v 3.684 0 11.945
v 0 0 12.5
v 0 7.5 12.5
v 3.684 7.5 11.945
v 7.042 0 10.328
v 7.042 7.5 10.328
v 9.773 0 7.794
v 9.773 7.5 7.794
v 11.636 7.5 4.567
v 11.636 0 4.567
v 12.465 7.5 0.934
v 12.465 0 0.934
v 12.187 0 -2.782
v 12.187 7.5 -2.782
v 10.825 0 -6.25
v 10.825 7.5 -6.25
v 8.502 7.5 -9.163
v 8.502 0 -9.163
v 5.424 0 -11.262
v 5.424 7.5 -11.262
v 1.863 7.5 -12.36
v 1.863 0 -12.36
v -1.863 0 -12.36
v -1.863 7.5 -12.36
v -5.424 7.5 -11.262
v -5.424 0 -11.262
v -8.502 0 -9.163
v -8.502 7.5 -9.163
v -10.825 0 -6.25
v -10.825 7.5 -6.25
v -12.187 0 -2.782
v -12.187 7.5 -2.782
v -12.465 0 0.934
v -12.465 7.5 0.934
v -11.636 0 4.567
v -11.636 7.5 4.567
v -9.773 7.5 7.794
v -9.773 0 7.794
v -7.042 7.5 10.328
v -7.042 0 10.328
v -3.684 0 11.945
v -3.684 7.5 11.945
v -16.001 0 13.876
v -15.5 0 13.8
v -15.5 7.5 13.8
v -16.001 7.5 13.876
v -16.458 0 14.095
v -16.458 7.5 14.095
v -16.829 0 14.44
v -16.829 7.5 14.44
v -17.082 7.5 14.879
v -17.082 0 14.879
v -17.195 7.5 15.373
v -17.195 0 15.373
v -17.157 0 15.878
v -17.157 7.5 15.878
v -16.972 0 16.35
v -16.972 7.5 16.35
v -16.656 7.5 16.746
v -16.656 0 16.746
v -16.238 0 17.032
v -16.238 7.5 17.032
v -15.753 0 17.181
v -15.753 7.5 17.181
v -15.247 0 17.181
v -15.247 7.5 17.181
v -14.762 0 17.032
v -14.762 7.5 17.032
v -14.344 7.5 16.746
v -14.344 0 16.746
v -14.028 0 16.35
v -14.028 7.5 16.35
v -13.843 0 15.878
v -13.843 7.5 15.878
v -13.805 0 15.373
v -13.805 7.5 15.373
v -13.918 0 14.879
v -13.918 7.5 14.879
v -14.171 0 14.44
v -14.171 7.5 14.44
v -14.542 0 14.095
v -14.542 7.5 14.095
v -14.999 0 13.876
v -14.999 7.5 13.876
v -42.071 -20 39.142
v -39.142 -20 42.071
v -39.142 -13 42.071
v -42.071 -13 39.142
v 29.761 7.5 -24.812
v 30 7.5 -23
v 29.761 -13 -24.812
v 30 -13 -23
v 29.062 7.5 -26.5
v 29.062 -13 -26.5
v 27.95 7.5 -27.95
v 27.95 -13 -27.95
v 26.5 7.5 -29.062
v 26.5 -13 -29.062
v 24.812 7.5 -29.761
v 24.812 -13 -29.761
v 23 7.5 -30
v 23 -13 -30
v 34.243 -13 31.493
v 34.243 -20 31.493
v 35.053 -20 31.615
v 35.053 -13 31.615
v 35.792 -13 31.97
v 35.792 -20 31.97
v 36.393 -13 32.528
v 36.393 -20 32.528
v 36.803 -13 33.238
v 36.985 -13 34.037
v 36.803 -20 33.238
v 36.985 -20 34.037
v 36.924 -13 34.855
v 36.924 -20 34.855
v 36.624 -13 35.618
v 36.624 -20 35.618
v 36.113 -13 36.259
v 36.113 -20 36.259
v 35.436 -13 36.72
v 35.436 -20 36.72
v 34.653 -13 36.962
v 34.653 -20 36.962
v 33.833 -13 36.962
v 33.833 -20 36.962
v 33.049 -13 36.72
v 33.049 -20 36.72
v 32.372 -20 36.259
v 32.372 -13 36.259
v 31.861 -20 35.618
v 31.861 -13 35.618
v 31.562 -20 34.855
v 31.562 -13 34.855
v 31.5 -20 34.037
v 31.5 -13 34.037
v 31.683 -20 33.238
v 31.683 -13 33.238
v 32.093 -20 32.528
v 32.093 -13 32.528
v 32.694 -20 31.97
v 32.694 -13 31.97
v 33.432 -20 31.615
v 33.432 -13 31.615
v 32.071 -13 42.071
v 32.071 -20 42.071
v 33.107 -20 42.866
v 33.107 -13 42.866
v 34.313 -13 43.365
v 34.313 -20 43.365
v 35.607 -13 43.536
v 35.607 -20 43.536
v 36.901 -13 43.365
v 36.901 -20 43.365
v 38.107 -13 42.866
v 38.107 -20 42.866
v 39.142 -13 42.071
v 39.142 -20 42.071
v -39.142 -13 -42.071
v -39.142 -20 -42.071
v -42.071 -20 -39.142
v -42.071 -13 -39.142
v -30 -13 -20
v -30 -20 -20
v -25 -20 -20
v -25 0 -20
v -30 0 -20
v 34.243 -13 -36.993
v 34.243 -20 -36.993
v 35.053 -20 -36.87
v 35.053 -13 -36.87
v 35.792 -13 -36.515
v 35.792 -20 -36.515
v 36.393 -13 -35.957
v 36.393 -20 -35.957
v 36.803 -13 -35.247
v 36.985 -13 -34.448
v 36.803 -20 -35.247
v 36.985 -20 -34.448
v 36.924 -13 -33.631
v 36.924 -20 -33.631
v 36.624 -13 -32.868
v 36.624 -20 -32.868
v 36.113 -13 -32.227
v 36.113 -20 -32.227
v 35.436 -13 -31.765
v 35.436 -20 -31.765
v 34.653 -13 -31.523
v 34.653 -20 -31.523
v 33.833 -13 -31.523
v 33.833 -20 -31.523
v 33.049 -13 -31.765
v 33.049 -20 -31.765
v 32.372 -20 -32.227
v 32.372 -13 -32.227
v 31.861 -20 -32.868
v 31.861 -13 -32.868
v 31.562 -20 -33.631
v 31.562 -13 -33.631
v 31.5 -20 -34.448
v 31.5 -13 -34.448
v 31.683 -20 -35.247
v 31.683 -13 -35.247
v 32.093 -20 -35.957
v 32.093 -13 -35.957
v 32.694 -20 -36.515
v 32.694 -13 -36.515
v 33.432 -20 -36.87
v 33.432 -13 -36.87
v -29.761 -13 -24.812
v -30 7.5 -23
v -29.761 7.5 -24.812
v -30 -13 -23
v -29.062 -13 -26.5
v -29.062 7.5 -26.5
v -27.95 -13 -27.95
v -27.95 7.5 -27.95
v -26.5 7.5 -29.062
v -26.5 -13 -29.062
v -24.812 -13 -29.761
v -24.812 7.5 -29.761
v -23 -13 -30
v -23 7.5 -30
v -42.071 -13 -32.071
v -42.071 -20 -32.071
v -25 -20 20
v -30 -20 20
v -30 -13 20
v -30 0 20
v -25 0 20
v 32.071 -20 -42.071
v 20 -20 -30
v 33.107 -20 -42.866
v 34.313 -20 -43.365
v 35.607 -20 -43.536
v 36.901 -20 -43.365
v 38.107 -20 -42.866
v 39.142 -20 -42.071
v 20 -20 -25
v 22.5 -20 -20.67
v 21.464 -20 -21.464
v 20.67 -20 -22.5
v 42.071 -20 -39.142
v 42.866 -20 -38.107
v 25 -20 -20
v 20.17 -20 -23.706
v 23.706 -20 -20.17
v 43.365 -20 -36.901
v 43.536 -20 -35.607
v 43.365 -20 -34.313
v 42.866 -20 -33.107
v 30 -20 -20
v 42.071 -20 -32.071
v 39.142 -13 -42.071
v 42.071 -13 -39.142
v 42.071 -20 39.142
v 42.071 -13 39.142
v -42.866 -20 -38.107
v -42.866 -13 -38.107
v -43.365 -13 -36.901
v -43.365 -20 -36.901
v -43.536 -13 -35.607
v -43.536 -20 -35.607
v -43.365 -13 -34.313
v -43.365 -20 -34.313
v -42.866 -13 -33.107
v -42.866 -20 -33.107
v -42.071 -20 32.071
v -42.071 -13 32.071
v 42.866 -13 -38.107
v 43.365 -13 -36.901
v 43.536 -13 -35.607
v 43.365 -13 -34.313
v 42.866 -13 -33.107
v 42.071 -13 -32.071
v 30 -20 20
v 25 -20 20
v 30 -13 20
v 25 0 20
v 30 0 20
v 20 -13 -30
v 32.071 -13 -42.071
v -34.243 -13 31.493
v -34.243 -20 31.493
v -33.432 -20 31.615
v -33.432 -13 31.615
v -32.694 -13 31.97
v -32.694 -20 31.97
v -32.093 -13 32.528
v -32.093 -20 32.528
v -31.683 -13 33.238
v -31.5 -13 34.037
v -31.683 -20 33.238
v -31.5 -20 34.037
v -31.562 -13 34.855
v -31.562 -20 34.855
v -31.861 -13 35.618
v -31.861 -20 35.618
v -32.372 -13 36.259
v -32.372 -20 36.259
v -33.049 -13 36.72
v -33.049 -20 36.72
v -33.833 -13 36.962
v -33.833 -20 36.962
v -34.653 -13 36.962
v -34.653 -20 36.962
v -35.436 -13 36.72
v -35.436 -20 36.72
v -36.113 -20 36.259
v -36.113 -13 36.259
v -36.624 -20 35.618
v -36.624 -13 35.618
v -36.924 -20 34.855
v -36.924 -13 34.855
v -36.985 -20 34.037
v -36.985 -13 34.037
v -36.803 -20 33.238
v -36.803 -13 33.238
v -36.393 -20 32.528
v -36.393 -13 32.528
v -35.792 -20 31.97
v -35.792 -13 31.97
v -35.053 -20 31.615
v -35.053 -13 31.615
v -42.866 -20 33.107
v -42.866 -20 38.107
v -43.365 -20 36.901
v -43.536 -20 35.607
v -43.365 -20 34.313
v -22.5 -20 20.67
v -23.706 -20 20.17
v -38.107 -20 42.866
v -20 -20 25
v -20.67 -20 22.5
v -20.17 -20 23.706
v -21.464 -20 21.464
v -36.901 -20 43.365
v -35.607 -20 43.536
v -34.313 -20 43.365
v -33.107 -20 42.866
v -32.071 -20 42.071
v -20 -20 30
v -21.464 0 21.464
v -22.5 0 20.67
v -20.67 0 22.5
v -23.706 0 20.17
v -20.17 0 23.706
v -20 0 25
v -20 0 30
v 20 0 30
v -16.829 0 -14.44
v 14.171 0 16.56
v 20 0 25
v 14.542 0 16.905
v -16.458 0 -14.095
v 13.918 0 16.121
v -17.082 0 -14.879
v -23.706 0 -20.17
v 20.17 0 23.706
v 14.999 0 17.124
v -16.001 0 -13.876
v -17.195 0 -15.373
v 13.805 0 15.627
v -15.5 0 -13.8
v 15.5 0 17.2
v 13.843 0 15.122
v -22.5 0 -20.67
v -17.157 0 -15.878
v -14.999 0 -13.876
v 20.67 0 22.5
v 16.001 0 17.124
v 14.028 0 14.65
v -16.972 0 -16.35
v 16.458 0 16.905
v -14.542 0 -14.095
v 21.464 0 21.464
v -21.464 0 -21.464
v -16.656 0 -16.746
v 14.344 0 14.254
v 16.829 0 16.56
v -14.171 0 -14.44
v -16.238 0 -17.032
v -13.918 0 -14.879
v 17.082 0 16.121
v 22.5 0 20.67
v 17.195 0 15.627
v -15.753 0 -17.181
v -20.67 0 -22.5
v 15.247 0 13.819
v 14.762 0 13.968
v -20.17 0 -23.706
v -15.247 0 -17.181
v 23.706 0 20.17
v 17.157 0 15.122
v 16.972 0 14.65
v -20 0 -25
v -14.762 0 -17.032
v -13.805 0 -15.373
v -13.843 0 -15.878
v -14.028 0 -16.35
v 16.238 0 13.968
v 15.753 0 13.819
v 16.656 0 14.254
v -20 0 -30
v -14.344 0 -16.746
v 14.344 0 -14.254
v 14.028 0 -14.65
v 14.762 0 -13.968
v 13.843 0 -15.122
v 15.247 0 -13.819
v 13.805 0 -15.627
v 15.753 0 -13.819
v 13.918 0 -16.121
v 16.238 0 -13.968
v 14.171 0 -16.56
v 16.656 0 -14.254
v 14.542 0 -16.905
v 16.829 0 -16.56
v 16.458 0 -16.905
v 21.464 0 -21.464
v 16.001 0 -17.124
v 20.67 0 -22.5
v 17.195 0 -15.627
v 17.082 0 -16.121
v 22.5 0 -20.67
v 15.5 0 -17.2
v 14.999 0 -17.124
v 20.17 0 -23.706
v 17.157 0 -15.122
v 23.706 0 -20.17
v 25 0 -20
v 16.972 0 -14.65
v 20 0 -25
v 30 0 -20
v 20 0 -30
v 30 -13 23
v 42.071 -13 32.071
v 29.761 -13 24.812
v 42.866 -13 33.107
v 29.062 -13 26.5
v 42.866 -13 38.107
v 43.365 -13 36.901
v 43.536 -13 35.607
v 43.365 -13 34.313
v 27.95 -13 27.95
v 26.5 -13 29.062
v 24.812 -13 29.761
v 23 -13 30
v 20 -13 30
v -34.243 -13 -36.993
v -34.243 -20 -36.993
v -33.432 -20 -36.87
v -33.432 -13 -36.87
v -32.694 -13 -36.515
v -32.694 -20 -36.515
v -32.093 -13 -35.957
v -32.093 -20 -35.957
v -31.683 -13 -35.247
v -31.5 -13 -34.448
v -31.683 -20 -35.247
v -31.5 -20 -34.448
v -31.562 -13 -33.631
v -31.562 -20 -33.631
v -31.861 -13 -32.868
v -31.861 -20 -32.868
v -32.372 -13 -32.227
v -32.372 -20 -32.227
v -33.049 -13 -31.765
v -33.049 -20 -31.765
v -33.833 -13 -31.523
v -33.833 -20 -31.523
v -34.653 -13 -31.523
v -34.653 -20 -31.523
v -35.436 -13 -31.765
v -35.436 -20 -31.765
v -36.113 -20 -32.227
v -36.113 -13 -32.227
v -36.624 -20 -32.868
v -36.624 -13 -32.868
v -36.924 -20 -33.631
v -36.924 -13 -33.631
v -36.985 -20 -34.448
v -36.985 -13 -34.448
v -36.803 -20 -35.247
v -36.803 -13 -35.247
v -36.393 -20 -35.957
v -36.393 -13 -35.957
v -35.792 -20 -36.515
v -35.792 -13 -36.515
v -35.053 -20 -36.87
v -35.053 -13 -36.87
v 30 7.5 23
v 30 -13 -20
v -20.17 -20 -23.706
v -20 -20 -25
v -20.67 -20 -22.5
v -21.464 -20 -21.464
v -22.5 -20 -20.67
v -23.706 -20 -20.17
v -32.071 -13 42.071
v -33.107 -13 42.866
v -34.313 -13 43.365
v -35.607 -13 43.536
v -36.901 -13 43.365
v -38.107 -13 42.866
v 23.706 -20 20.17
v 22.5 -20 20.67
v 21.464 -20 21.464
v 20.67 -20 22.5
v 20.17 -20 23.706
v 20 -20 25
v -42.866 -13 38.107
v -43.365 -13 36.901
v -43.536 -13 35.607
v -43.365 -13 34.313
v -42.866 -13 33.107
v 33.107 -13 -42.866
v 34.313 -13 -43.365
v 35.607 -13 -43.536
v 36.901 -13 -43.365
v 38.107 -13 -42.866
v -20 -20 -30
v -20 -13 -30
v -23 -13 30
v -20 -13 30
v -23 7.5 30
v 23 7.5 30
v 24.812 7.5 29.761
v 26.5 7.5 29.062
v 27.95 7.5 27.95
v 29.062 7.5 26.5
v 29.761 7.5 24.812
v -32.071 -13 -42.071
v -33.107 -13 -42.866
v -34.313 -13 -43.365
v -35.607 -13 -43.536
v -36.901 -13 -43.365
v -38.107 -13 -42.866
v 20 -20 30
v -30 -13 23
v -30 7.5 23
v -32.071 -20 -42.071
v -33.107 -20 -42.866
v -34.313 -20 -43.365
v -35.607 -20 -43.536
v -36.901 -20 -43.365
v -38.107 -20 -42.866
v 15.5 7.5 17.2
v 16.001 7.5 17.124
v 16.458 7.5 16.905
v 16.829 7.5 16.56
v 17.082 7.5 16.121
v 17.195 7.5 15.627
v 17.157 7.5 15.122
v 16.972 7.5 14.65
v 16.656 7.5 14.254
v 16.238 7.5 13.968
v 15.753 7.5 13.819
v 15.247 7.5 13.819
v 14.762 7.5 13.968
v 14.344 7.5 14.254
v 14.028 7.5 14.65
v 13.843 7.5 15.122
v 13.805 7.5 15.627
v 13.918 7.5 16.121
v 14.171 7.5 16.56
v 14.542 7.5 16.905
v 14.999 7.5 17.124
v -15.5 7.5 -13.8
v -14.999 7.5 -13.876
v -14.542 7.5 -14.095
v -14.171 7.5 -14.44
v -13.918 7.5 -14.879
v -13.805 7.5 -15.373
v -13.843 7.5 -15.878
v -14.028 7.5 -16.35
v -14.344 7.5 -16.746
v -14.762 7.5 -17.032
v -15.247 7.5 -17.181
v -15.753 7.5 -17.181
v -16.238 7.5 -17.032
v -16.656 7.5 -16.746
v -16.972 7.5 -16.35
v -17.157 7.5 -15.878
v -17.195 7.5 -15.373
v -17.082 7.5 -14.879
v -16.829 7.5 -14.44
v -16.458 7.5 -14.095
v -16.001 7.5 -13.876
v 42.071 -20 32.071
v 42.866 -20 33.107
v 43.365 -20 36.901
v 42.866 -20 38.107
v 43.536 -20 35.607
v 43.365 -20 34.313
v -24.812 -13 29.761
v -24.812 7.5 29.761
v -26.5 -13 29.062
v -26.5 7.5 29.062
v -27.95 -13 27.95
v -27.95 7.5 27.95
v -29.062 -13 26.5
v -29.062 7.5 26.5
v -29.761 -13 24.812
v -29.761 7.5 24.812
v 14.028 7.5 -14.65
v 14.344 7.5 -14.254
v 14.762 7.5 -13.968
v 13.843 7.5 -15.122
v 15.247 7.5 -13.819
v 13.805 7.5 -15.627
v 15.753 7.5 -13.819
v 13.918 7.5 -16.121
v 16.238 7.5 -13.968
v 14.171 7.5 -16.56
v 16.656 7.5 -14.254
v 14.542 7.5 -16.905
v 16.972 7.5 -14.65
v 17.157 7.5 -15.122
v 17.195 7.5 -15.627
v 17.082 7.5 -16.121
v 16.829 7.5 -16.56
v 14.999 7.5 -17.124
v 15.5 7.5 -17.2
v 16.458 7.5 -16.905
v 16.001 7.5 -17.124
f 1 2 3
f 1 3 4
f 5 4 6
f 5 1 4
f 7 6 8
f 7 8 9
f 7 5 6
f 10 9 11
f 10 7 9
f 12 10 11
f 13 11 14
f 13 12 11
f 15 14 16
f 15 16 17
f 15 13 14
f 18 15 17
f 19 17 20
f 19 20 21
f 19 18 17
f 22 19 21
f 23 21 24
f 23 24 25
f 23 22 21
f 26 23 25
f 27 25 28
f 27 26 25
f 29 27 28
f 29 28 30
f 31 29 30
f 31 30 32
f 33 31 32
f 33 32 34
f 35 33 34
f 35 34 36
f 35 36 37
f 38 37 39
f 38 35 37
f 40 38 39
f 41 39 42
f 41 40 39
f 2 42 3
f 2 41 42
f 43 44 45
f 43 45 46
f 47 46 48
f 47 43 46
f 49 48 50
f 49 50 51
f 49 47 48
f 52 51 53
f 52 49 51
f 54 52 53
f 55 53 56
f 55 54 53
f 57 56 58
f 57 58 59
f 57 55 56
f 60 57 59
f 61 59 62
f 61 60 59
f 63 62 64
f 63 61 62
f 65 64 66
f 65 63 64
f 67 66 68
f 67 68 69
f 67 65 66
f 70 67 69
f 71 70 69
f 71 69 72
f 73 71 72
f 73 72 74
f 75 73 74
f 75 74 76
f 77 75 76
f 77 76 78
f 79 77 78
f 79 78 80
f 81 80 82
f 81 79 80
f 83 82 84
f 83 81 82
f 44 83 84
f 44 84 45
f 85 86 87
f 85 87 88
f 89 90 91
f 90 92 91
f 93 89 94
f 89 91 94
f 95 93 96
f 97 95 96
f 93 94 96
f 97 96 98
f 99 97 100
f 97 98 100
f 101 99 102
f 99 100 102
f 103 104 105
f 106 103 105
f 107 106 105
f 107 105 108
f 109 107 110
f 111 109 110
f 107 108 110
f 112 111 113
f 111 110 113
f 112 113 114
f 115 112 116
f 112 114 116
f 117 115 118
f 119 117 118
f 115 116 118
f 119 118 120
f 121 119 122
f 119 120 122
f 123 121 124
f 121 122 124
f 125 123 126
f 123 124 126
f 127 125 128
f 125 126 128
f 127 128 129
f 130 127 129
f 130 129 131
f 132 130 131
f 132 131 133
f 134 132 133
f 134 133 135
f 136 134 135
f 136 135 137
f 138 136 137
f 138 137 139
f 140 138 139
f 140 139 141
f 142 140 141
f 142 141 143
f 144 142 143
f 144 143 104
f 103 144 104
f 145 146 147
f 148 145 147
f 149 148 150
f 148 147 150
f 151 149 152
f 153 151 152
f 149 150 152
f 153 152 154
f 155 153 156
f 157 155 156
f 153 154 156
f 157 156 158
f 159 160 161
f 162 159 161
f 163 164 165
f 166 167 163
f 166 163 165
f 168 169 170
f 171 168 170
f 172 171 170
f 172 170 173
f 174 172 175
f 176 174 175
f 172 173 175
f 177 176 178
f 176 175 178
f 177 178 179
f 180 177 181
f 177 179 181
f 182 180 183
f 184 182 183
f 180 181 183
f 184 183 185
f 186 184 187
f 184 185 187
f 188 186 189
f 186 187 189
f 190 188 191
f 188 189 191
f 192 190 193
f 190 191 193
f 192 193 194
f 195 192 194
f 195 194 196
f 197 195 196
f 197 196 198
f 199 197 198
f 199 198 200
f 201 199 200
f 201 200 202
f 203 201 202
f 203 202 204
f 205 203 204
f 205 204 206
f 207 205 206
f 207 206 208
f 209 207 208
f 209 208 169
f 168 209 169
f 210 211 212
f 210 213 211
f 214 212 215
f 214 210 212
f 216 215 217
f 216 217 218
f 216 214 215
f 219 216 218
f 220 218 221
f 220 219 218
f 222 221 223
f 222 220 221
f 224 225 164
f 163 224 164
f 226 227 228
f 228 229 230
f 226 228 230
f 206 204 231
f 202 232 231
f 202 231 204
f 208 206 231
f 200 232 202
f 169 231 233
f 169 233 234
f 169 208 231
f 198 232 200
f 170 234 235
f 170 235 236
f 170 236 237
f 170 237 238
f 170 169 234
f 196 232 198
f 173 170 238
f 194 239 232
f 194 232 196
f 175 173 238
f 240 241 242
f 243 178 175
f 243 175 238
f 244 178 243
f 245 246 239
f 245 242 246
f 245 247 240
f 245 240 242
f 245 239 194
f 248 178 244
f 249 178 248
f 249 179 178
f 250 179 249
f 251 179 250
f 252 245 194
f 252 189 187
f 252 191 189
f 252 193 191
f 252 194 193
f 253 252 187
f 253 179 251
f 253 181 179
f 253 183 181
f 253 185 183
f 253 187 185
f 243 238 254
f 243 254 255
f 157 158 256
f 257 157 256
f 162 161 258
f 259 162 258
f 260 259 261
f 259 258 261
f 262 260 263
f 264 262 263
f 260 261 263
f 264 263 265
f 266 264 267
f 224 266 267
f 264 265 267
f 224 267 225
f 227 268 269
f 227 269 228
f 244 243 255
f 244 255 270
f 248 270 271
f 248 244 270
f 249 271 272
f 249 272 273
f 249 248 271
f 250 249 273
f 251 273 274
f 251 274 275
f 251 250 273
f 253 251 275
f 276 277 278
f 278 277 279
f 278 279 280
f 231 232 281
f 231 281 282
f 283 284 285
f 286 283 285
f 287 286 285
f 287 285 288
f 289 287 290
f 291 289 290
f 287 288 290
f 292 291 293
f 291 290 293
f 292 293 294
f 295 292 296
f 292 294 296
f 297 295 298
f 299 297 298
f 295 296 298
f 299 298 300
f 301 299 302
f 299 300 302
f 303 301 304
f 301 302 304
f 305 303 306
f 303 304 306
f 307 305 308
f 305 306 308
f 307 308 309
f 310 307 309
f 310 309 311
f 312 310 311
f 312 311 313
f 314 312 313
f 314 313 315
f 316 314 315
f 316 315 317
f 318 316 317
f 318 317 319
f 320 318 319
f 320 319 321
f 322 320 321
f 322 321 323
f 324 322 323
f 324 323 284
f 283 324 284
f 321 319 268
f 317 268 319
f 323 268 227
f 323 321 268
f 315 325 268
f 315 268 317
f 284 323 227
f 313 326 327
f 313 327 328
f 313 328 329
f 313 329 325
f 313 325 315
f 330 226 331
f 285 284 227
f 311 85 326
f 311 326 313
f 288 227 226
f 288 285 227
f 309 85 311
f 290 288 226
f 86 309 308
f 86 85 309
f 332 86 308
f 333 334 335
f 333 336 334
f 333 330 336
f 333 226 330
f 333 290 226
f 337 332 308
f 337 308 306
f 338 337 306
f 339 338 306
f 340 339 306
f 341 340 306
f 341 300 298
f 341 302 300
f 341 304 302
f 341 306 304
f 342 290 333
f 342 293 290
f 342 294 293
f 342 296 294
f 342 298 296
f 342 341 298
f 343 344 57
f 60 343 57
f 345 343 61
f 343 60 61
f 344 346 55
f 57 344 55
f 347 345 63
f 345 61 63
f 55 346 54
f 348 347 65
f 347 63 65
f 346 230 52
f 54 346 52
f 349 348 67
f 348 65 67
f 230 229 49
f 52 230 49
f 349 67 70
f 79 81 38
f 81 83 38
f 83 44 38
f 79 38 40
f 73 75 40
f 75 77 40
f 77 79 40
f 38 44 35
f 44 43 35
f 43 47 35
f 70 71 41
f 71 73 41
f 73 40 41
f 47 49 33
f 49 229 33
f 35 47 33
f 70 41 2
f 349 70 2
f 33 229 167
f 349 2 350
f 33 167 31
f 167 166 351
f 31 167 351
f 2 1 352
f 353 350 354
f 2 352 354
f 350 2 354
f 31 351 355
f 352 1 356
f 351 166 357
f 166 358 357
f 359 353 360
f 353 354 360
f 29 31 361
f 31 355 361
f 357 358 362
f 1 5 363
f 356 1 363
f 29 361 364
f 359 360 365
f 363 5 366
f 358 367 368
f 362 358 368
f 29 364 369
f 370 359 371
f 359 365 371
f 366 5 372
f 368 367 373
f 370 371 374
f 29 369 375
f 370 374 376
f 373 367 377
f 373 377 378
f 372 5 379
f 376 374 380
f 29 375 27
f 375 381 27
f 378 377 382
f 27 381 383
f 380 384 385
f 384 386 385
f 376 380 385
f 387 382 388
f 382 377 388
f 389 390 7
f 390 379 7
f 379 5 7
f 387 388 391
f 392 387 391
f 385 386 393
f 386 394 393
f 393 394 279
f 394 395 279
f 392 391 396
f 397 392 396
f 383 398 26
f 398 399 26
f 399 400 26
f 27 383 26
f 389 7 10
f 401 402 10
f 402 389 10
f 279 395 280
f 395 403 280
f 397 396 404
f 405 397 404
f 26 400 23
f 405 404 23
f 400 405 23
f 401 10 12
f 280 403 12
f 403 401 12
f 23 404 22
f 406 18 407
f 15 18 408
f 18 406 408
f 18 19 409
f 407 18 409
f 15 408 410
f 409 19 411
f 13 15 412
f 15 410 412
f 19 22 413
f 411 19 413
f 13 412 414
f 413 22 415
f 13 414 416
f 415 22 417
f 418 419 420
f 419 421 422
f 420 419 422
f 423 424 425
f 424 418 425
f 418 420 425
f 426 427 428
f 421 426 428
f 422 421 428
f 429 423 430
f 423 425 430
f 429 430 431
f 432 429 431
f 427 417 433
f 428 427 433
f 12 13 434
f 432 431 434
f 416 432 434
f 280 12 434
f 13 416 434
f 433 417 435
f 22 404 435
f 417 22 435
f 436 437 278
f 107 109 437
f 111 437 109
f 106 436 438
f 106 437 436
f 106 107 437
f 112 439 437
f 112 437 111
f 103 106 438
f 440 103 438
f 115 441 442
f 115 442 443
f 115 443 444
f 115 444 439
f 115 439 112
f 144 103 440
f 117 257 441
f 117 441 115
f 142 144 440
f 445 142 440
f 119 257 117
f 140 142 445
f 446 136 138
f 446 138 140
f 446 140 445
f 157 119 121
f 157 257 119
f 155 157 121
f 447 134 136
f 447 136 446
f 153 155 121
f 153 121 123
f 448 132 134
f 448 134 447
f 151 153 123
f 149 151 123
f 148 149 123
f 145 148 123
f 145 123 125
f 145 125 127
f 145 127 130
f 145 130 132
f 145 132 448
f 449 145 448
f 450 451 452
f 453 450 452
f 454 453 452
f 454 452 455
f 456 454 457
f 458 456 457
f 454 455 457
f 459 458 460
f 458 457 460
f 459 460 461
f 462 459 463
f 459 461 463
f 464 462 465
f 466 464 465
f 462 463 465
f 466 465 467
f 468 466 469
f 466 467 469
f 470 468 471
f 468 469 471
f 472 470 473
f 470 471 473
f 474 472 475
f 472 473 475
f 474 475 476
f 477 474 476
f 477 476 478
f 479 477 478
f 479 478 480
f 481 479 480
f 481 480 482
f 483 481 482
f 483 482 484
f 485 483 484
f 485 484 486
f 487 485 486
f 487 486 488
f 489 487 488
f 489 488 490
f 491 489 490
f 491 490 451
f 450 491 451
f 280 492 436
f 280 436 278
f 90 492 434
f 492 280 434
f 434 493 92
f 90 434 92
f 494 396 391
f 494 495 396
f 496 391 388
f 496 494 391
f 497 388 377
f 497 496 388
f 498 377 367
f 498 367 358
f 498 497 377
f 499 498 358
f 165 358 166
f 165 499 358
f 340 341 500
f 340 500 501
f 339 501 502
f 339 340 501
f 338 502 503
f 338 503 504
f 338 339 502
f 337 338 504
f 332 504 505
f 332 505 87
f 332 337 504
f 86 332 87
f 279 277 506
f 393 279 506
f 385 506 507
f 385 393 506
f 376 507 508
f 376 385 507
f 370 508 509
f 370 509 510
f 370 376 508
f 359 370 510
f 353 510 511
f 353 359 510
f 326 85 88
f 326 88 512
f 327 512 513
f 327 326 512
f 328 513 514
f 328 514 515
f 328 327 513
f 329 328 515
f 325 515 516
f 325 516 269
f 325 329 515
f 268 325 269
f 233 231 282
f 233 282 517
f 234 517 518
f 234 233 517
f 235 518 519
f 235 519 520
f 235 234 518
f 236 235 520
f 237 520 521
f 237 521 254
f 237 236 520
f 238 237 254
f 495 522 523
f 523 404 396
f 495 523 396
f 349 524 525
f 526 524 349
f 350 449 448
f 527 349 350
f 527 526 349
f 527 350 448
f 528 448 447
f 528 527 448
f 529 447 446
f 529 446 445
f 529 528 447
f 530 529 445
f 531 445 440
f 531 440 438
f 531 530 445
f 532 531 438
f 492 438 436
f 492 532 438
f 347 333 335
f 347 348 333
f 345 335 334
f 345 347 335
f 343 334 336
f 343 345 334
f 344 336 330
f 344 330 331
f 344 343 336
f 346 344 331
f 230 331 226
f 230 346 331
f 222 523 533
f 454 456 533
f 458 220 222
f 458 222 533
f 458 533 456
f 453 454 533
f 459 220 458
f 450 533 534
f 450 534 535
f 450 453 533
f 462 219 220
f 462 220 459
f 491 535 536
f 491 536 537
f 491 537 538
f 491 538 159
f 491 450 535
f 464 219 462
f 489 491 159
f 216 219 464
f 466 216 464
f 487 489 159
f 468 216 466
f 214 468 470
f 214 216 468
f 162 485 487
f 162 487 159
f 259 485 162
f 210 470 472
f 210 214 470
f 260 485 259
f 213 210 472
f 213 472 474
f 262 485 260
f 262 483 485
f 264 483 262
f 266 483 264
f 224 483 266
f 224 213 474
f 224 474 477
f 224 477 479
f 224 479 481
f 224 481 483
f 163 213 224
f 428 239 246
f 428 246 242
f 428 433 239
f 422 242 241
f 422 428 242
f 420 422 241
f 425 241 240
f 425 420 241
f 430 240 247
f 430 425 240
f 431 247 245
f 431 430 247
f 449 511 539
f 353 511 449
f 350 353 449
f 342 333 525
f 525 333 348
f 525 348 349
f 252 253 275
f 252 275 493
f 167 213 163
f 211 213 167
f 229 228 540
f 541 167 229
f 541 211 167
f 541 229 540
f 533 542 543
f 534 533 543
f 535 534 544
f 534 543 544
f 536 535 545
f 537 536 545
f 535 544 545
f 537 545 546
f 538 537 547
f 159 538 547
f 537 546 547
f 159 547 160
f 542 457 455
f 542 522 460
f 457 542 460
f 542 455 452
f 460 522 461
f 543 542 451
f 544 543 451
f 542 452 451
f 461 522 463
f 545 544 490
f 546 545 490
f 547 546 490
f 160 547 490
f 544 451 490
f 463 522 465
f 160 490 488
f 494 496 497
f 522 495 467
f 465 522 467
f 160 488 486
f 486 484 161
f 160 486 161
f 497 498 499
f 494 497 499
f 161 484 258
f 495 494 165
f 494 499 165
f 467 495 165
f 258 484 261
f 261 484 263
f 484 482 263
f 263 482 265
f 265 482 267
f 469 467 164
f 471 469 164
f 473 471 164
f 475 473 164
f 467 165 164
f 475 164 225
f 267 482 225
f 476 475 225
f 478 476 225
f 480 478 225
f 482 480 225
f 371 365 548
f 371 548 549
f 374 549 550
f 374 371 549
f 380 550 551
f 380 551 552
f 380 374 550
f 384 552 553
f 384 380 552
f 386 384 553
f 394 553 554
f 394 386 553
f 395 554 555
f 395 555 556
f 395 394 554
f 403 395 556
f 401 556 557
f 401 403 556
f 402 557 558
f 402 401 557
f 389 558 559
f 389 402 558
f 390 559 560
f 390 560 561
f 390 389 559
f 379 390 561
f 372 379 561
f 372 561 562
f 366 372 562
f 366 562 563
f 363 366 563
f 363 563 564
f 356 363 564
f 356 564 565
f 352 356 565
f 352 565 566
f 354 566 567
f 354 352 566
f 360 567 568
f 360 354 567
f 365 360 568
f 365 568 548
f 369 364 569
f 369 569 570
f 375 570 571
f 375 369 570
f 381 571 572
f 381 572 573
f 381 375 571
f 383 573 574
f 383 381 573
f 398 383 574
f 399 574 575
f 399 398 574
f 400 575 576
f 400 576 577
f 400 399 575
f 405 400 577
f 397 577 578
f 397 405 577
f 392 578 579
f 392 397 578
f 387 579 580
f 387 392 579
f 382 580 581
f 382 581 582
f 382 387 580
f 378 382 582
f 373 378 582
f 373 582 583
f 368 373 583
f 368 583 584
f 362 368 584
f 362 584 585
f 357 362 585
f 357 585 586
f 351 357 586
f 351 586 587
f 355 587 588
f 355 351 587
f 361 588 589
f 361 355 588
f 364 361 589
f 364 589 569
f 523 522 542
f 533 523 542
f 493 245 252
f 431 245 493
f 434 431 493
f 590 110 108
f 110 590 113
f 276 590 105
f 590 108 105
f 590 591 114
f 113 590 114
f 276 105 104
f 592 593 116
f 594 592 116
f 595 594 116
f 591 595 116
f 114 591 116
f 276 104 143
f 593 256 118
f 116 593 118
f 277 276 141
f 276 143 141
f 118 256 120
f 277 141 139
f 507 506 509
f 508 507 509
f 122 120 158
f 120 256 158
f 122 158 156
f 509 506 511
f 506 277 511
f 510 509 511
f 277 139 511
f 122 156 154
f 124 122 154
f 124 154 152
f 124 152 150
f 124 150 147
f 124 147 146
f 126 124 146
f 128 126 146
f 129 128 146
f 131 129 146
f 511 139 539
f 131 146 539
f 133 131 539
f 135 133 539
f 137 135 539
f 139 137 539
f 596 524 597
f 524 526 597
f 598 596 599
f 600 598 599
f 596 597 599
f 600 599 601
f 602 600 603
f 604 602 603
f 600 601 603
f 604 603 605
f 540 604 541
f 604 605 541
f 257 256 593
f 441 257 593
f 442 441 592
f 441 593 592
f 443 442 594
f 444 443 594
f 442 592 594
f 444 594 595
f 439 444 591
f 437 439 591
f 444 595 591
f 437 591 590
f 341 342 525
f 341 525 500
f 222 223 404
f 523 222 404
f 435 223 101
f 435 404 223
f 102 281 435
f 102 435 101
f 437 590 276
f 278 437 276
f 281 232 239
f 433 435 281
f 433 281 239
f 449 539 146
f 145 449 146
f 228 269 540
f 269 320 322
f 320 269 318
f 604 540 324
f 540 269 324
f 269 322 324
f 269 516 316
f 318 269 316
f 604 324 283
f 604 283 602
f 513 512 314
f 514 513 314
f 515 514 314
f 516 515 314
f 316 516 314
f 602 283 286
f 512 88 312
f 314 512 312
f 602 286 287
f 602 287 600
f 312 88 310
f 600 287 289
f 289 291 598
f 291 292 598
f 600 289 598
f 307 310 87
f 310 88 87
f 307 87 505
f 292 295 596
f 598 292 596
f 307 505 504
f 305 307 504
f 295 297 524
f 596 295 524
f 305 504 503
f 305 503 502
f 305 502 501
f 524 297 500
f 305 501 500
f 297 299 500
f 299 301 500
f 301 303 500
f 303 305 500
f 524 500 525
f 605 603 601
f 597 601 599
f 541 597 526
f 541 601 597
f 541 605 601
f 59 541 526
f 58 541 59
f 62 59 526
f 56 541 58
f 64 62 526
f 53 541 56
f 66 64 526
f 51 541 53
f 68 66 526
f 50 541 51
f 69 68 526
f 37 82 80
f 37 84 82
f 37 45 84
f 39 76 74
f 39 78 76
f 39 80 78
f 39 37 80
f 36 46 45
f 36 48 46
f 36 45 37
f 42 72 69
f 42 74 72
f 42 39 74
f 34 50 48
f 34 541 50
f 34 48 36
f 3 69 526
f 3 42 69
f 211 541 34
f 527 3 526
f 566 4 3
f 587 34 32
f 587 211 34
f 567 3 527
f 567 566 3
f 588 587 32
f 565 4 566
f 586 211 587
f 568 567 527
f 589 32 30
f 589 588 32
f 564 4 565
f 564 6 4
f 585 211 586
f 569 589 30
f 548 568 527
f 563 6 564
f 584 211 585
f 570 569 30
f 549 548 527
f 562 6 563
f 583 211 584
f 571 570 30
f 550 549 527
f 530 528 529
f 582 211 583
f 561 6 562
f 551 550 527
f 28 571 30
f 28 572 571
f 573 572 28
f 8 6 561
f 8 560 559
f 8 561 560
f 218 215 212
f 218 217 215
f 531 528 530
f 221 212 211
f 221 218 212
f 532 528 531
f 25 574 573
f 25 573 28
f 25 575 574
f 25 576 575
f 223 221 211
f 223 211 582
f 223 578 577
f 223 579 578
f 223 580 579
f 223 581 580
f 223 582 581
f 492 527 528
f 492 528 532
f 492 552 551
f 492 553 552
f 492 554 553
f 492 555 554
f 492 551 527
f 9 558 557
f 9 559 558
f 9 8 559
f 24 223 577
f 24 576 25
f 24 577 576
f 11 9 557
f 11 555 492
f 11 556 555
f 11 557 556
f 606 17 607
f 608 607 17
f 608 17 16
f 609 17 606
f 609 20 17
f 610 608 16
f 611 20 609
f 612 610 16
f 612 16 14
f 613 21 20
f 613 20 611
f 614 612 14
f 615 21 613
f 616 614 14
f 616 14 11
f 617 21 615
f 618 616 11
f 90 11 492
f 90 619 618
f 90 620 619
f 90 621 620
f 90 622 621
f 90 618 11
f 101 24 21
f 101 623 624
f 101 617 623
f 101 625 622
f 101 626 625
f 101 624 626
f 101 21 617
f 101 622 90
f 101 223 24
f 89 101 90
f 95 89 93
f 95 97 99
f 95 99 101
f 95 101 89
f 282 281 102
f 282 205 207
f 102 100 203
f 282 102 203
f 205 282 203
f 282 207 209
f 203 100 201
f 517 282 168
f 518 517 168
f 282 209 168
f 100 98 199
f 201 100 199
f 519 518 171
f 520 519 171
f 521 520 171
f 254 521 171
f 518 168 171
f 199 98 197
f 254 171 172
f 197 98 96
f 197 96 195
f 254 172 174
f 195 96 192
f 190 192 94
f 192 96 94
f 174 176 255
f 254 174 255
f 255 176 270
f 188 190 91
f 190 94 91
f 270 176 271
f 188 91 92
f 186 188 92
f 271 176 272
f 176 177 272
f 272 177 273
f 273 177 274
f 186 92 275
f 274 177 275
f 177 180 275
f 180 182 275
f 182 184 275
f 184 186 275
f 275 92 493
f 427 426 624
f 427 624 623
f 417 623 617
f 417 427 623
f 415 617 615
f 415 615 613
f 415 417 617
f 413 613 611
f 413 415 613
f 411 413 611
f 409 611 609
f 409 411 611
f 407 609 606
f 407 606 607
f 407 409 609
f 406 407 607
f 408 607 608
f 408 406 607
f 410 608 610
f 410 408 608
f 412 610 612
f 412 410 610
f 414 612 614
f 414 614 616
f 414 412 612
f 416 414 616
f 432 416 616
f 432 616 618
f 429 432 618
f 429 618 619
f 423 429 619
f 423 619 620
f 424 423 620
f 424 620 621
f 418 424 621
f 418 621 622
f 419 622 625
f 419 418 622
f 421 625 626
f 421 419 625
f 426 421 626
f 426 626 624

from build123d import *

# Parameters (mm, degrees)
SKETCH2_W           = 60
SKETCH2_H           = 60
SKETCH2_R           = 1.7
SKETCH2_R_2         = 12.5
BOSS_EXTRUDE2_DEPTH = 7.5
SKETCH3_W           = 10
SKETCH3_H           = 10
BOSS_EXTRUDE3_DEPTH = 20
BOSS_EXTRUDE5_DEPTH = 7
FILLET2_R           = 7
FILLET3_R           = 5
SKETCH7_R           = 2.75
CUT_EXTRUDE1_DEPTH  = 68.430967848


with BuildPart() as part:
    # Sketch2 → Boss-Extrude2 (new body)
    with BuildSketch(Plane(origin=(0, 0, 0), x_dir=(1, 0, 0), z_dir=(0, 1, 0))):
        Rectangle(SKETCH2_W, SKETCH2_H)
        with Locations(Location((-15.5, 15.5, 0), (0, 0, 270))):
            Circle(SKETCH2_R, mode=Mode.SUBTRACT)
        with Locations(Location((15.5, 15.5, 0), (0, 0, 90))):
            Circle(SKETCH2_R, mode=Mode.SUBTRACT)
        with Locations(Location((-15.5, -15.5, 0), (0, 0, 90))):
            Circle(SKETCH2_R, mode=Mode.SUBTRACT)
        with Locations(Location((15.5, -15.5, 0), (0, 0, 270))):
            Circle(SKETCH2_R, mode=Mode.SUBTRACT)
        with Locations(Location((0, 0, 0), (0, 0, 270))):
            Circle(SKETCH2_R_2, mode=Mode.SUBTRACT)
    extrude(amount=BOSS_EXTRUDE2_DEPTH)

    # Sketch3 → Boss-Extrude3 (add)
    with BuildSketch(Plane.XZ):
        with Locations((-25, 25)):
            Rectangle(SKETCH3_W, SKETCH3_H)
        with Locations((-25, -25)):
            Rectangle(SKETCH3_W, SKETCH3_H)
        with Locations((25, -25)):
            Rectangle(SKETCH3_W, SKETCH3_H)
        with Locations((25, 25)):
            Rectangle(SKETCH3_W, SKETCH3_H)
    extrude(amount=BOSS_EXTRUDE3_DEPTH)

    # Sketch5 → Boss-Extrude5 (add)
    with BuildSketch(Plane.XZ.offset(20)):
        with BuildLine():
            Line((20, -30), (32.071067812, -42.071067812))
            ThreePointArc((32.071067812, -42.071067812), (35.606601718, -43.535533906), (39.142135624, -42.071067812))
            Line((39.142135624, -42.071067812), (42.071067812, -39.142135624))
            ThreePointArc((42.071067812, -39.142135624), (43.535533906, -35.606601718), (42.071067812, -32.071067812))
            Line((42.071067812, -32.071067812), (30, -20))
            Line((30, -20), (20, -20))
            Line((20, -20), (20, -30))
        make_face()
        with BuildLine():
            Line((-20, -20), (-20, -30))
            Line((-20, -30), (-32.071067812, -42.071067812))
            ThreePointArc((-32.071067812, -42.071067812), (-35.606601718, -43.535533906), (-39.142135624, -42.071067812))
            Line((-39.142135624, -42.071067812), (-42.071067812, -39.142135624))
            ThreePointArc((-42.071067812, -39.142135624), (-43.535533906, -35.606601718), (-42.071067812, -32.071067812))
            Line((-42.071067812, -32.071067812), (-30, -20))
            Line((-30, -20), (-20, -20))
        make_face()
        with BuildLine():
            Line((20, 20), (20, 30))
            Line((20, 30), (32.071067812, 42.071067812))
            ThreePointArc((32.071067812, 42.071067812), (35.606601718, 43.535533906), (39.142135624, 42.071067812))
            Line((39.142135624, 42.071067812), (42.071067812, 39.142135624))
            ThreePointArc((42.071067812, 39.142135624), (43.535533906, 35.606601718), (42.071067812, 32.071067812))
            Line((42.071067812, 32.071067812), (30, 20))
            Line((30, 20), (20, 20))
        make_face()
        with BuildLine():
            Line((-20, 30), (-32.071067812, 42.071067812))
            ThreePointArc((-32.071067812, 42.071067812), (-35.606601718, 43.535533906), (-39.142135624, 42.071067812))
            Line((-39.142135624, 42.071067812), (-42.071067812, 39.142135624))
            ThreePointArc((-42.071067812, 39.142135624), (-43.535533906, 35.606601718), (-42.071067812, 32.071067812))
            Line((-42.071067812, 32.071067812), (-30, 20))
            Line((-30, 20), (-20, 20))
            Line((-20, 20), (-20, 30))
        make_face()
    extrude(amount=-BOSS_EXTRUDE5_DEPTH)

    # Fillet2
    fillet2_edges = [part.edges().sort_by_distance(p)[0] for p in [
        (30, -2.75, 30),
        (-30, -2.75, 30),
        (-30, -2.75, -30),
        (30, -2.75, -30),
    ]]
    fillet(fillet2_edges, radius=FILLET2_R)

    # Fillet3
    fillet3_edges = [part.edges().sort_by_distance(p)[0] for p in [
        (-20, -10, 20),
        (-20, -10, -20),
        (20, -10, -20),
        (20, -10, 20),
    ]]
    fillet(fillet3_edges, radius=FILLET3_R)

    # Sketch7 → Cut-Extrude1 (cut, through all)
    with BuildSketch(Plane.XZ.offset(20)):
        with Locations(Location((34.242640687, -34.242640687, 0), (0, 0, 270))):
            Circle(SKETCH7_R)
        with Locations(Location((-34.242640687, -34.242640687, 0), (0, 0, 270))):
            Circle(SKETCH7_R)
        with Locations(Location((-34.242640687, 34.242640687, 0), (0, 0, 270))):
            Circle(SKETCH7_R)
        with Locations(Location((34.242640687, 34.242640687, 0), (0, 0, 270))):
            Circle(SKETCH7_R)
    extrude(amount=-CUT_EXTRUDE1_DEPTH, mode=Mode.SUBTRACT)


solid = part.part
